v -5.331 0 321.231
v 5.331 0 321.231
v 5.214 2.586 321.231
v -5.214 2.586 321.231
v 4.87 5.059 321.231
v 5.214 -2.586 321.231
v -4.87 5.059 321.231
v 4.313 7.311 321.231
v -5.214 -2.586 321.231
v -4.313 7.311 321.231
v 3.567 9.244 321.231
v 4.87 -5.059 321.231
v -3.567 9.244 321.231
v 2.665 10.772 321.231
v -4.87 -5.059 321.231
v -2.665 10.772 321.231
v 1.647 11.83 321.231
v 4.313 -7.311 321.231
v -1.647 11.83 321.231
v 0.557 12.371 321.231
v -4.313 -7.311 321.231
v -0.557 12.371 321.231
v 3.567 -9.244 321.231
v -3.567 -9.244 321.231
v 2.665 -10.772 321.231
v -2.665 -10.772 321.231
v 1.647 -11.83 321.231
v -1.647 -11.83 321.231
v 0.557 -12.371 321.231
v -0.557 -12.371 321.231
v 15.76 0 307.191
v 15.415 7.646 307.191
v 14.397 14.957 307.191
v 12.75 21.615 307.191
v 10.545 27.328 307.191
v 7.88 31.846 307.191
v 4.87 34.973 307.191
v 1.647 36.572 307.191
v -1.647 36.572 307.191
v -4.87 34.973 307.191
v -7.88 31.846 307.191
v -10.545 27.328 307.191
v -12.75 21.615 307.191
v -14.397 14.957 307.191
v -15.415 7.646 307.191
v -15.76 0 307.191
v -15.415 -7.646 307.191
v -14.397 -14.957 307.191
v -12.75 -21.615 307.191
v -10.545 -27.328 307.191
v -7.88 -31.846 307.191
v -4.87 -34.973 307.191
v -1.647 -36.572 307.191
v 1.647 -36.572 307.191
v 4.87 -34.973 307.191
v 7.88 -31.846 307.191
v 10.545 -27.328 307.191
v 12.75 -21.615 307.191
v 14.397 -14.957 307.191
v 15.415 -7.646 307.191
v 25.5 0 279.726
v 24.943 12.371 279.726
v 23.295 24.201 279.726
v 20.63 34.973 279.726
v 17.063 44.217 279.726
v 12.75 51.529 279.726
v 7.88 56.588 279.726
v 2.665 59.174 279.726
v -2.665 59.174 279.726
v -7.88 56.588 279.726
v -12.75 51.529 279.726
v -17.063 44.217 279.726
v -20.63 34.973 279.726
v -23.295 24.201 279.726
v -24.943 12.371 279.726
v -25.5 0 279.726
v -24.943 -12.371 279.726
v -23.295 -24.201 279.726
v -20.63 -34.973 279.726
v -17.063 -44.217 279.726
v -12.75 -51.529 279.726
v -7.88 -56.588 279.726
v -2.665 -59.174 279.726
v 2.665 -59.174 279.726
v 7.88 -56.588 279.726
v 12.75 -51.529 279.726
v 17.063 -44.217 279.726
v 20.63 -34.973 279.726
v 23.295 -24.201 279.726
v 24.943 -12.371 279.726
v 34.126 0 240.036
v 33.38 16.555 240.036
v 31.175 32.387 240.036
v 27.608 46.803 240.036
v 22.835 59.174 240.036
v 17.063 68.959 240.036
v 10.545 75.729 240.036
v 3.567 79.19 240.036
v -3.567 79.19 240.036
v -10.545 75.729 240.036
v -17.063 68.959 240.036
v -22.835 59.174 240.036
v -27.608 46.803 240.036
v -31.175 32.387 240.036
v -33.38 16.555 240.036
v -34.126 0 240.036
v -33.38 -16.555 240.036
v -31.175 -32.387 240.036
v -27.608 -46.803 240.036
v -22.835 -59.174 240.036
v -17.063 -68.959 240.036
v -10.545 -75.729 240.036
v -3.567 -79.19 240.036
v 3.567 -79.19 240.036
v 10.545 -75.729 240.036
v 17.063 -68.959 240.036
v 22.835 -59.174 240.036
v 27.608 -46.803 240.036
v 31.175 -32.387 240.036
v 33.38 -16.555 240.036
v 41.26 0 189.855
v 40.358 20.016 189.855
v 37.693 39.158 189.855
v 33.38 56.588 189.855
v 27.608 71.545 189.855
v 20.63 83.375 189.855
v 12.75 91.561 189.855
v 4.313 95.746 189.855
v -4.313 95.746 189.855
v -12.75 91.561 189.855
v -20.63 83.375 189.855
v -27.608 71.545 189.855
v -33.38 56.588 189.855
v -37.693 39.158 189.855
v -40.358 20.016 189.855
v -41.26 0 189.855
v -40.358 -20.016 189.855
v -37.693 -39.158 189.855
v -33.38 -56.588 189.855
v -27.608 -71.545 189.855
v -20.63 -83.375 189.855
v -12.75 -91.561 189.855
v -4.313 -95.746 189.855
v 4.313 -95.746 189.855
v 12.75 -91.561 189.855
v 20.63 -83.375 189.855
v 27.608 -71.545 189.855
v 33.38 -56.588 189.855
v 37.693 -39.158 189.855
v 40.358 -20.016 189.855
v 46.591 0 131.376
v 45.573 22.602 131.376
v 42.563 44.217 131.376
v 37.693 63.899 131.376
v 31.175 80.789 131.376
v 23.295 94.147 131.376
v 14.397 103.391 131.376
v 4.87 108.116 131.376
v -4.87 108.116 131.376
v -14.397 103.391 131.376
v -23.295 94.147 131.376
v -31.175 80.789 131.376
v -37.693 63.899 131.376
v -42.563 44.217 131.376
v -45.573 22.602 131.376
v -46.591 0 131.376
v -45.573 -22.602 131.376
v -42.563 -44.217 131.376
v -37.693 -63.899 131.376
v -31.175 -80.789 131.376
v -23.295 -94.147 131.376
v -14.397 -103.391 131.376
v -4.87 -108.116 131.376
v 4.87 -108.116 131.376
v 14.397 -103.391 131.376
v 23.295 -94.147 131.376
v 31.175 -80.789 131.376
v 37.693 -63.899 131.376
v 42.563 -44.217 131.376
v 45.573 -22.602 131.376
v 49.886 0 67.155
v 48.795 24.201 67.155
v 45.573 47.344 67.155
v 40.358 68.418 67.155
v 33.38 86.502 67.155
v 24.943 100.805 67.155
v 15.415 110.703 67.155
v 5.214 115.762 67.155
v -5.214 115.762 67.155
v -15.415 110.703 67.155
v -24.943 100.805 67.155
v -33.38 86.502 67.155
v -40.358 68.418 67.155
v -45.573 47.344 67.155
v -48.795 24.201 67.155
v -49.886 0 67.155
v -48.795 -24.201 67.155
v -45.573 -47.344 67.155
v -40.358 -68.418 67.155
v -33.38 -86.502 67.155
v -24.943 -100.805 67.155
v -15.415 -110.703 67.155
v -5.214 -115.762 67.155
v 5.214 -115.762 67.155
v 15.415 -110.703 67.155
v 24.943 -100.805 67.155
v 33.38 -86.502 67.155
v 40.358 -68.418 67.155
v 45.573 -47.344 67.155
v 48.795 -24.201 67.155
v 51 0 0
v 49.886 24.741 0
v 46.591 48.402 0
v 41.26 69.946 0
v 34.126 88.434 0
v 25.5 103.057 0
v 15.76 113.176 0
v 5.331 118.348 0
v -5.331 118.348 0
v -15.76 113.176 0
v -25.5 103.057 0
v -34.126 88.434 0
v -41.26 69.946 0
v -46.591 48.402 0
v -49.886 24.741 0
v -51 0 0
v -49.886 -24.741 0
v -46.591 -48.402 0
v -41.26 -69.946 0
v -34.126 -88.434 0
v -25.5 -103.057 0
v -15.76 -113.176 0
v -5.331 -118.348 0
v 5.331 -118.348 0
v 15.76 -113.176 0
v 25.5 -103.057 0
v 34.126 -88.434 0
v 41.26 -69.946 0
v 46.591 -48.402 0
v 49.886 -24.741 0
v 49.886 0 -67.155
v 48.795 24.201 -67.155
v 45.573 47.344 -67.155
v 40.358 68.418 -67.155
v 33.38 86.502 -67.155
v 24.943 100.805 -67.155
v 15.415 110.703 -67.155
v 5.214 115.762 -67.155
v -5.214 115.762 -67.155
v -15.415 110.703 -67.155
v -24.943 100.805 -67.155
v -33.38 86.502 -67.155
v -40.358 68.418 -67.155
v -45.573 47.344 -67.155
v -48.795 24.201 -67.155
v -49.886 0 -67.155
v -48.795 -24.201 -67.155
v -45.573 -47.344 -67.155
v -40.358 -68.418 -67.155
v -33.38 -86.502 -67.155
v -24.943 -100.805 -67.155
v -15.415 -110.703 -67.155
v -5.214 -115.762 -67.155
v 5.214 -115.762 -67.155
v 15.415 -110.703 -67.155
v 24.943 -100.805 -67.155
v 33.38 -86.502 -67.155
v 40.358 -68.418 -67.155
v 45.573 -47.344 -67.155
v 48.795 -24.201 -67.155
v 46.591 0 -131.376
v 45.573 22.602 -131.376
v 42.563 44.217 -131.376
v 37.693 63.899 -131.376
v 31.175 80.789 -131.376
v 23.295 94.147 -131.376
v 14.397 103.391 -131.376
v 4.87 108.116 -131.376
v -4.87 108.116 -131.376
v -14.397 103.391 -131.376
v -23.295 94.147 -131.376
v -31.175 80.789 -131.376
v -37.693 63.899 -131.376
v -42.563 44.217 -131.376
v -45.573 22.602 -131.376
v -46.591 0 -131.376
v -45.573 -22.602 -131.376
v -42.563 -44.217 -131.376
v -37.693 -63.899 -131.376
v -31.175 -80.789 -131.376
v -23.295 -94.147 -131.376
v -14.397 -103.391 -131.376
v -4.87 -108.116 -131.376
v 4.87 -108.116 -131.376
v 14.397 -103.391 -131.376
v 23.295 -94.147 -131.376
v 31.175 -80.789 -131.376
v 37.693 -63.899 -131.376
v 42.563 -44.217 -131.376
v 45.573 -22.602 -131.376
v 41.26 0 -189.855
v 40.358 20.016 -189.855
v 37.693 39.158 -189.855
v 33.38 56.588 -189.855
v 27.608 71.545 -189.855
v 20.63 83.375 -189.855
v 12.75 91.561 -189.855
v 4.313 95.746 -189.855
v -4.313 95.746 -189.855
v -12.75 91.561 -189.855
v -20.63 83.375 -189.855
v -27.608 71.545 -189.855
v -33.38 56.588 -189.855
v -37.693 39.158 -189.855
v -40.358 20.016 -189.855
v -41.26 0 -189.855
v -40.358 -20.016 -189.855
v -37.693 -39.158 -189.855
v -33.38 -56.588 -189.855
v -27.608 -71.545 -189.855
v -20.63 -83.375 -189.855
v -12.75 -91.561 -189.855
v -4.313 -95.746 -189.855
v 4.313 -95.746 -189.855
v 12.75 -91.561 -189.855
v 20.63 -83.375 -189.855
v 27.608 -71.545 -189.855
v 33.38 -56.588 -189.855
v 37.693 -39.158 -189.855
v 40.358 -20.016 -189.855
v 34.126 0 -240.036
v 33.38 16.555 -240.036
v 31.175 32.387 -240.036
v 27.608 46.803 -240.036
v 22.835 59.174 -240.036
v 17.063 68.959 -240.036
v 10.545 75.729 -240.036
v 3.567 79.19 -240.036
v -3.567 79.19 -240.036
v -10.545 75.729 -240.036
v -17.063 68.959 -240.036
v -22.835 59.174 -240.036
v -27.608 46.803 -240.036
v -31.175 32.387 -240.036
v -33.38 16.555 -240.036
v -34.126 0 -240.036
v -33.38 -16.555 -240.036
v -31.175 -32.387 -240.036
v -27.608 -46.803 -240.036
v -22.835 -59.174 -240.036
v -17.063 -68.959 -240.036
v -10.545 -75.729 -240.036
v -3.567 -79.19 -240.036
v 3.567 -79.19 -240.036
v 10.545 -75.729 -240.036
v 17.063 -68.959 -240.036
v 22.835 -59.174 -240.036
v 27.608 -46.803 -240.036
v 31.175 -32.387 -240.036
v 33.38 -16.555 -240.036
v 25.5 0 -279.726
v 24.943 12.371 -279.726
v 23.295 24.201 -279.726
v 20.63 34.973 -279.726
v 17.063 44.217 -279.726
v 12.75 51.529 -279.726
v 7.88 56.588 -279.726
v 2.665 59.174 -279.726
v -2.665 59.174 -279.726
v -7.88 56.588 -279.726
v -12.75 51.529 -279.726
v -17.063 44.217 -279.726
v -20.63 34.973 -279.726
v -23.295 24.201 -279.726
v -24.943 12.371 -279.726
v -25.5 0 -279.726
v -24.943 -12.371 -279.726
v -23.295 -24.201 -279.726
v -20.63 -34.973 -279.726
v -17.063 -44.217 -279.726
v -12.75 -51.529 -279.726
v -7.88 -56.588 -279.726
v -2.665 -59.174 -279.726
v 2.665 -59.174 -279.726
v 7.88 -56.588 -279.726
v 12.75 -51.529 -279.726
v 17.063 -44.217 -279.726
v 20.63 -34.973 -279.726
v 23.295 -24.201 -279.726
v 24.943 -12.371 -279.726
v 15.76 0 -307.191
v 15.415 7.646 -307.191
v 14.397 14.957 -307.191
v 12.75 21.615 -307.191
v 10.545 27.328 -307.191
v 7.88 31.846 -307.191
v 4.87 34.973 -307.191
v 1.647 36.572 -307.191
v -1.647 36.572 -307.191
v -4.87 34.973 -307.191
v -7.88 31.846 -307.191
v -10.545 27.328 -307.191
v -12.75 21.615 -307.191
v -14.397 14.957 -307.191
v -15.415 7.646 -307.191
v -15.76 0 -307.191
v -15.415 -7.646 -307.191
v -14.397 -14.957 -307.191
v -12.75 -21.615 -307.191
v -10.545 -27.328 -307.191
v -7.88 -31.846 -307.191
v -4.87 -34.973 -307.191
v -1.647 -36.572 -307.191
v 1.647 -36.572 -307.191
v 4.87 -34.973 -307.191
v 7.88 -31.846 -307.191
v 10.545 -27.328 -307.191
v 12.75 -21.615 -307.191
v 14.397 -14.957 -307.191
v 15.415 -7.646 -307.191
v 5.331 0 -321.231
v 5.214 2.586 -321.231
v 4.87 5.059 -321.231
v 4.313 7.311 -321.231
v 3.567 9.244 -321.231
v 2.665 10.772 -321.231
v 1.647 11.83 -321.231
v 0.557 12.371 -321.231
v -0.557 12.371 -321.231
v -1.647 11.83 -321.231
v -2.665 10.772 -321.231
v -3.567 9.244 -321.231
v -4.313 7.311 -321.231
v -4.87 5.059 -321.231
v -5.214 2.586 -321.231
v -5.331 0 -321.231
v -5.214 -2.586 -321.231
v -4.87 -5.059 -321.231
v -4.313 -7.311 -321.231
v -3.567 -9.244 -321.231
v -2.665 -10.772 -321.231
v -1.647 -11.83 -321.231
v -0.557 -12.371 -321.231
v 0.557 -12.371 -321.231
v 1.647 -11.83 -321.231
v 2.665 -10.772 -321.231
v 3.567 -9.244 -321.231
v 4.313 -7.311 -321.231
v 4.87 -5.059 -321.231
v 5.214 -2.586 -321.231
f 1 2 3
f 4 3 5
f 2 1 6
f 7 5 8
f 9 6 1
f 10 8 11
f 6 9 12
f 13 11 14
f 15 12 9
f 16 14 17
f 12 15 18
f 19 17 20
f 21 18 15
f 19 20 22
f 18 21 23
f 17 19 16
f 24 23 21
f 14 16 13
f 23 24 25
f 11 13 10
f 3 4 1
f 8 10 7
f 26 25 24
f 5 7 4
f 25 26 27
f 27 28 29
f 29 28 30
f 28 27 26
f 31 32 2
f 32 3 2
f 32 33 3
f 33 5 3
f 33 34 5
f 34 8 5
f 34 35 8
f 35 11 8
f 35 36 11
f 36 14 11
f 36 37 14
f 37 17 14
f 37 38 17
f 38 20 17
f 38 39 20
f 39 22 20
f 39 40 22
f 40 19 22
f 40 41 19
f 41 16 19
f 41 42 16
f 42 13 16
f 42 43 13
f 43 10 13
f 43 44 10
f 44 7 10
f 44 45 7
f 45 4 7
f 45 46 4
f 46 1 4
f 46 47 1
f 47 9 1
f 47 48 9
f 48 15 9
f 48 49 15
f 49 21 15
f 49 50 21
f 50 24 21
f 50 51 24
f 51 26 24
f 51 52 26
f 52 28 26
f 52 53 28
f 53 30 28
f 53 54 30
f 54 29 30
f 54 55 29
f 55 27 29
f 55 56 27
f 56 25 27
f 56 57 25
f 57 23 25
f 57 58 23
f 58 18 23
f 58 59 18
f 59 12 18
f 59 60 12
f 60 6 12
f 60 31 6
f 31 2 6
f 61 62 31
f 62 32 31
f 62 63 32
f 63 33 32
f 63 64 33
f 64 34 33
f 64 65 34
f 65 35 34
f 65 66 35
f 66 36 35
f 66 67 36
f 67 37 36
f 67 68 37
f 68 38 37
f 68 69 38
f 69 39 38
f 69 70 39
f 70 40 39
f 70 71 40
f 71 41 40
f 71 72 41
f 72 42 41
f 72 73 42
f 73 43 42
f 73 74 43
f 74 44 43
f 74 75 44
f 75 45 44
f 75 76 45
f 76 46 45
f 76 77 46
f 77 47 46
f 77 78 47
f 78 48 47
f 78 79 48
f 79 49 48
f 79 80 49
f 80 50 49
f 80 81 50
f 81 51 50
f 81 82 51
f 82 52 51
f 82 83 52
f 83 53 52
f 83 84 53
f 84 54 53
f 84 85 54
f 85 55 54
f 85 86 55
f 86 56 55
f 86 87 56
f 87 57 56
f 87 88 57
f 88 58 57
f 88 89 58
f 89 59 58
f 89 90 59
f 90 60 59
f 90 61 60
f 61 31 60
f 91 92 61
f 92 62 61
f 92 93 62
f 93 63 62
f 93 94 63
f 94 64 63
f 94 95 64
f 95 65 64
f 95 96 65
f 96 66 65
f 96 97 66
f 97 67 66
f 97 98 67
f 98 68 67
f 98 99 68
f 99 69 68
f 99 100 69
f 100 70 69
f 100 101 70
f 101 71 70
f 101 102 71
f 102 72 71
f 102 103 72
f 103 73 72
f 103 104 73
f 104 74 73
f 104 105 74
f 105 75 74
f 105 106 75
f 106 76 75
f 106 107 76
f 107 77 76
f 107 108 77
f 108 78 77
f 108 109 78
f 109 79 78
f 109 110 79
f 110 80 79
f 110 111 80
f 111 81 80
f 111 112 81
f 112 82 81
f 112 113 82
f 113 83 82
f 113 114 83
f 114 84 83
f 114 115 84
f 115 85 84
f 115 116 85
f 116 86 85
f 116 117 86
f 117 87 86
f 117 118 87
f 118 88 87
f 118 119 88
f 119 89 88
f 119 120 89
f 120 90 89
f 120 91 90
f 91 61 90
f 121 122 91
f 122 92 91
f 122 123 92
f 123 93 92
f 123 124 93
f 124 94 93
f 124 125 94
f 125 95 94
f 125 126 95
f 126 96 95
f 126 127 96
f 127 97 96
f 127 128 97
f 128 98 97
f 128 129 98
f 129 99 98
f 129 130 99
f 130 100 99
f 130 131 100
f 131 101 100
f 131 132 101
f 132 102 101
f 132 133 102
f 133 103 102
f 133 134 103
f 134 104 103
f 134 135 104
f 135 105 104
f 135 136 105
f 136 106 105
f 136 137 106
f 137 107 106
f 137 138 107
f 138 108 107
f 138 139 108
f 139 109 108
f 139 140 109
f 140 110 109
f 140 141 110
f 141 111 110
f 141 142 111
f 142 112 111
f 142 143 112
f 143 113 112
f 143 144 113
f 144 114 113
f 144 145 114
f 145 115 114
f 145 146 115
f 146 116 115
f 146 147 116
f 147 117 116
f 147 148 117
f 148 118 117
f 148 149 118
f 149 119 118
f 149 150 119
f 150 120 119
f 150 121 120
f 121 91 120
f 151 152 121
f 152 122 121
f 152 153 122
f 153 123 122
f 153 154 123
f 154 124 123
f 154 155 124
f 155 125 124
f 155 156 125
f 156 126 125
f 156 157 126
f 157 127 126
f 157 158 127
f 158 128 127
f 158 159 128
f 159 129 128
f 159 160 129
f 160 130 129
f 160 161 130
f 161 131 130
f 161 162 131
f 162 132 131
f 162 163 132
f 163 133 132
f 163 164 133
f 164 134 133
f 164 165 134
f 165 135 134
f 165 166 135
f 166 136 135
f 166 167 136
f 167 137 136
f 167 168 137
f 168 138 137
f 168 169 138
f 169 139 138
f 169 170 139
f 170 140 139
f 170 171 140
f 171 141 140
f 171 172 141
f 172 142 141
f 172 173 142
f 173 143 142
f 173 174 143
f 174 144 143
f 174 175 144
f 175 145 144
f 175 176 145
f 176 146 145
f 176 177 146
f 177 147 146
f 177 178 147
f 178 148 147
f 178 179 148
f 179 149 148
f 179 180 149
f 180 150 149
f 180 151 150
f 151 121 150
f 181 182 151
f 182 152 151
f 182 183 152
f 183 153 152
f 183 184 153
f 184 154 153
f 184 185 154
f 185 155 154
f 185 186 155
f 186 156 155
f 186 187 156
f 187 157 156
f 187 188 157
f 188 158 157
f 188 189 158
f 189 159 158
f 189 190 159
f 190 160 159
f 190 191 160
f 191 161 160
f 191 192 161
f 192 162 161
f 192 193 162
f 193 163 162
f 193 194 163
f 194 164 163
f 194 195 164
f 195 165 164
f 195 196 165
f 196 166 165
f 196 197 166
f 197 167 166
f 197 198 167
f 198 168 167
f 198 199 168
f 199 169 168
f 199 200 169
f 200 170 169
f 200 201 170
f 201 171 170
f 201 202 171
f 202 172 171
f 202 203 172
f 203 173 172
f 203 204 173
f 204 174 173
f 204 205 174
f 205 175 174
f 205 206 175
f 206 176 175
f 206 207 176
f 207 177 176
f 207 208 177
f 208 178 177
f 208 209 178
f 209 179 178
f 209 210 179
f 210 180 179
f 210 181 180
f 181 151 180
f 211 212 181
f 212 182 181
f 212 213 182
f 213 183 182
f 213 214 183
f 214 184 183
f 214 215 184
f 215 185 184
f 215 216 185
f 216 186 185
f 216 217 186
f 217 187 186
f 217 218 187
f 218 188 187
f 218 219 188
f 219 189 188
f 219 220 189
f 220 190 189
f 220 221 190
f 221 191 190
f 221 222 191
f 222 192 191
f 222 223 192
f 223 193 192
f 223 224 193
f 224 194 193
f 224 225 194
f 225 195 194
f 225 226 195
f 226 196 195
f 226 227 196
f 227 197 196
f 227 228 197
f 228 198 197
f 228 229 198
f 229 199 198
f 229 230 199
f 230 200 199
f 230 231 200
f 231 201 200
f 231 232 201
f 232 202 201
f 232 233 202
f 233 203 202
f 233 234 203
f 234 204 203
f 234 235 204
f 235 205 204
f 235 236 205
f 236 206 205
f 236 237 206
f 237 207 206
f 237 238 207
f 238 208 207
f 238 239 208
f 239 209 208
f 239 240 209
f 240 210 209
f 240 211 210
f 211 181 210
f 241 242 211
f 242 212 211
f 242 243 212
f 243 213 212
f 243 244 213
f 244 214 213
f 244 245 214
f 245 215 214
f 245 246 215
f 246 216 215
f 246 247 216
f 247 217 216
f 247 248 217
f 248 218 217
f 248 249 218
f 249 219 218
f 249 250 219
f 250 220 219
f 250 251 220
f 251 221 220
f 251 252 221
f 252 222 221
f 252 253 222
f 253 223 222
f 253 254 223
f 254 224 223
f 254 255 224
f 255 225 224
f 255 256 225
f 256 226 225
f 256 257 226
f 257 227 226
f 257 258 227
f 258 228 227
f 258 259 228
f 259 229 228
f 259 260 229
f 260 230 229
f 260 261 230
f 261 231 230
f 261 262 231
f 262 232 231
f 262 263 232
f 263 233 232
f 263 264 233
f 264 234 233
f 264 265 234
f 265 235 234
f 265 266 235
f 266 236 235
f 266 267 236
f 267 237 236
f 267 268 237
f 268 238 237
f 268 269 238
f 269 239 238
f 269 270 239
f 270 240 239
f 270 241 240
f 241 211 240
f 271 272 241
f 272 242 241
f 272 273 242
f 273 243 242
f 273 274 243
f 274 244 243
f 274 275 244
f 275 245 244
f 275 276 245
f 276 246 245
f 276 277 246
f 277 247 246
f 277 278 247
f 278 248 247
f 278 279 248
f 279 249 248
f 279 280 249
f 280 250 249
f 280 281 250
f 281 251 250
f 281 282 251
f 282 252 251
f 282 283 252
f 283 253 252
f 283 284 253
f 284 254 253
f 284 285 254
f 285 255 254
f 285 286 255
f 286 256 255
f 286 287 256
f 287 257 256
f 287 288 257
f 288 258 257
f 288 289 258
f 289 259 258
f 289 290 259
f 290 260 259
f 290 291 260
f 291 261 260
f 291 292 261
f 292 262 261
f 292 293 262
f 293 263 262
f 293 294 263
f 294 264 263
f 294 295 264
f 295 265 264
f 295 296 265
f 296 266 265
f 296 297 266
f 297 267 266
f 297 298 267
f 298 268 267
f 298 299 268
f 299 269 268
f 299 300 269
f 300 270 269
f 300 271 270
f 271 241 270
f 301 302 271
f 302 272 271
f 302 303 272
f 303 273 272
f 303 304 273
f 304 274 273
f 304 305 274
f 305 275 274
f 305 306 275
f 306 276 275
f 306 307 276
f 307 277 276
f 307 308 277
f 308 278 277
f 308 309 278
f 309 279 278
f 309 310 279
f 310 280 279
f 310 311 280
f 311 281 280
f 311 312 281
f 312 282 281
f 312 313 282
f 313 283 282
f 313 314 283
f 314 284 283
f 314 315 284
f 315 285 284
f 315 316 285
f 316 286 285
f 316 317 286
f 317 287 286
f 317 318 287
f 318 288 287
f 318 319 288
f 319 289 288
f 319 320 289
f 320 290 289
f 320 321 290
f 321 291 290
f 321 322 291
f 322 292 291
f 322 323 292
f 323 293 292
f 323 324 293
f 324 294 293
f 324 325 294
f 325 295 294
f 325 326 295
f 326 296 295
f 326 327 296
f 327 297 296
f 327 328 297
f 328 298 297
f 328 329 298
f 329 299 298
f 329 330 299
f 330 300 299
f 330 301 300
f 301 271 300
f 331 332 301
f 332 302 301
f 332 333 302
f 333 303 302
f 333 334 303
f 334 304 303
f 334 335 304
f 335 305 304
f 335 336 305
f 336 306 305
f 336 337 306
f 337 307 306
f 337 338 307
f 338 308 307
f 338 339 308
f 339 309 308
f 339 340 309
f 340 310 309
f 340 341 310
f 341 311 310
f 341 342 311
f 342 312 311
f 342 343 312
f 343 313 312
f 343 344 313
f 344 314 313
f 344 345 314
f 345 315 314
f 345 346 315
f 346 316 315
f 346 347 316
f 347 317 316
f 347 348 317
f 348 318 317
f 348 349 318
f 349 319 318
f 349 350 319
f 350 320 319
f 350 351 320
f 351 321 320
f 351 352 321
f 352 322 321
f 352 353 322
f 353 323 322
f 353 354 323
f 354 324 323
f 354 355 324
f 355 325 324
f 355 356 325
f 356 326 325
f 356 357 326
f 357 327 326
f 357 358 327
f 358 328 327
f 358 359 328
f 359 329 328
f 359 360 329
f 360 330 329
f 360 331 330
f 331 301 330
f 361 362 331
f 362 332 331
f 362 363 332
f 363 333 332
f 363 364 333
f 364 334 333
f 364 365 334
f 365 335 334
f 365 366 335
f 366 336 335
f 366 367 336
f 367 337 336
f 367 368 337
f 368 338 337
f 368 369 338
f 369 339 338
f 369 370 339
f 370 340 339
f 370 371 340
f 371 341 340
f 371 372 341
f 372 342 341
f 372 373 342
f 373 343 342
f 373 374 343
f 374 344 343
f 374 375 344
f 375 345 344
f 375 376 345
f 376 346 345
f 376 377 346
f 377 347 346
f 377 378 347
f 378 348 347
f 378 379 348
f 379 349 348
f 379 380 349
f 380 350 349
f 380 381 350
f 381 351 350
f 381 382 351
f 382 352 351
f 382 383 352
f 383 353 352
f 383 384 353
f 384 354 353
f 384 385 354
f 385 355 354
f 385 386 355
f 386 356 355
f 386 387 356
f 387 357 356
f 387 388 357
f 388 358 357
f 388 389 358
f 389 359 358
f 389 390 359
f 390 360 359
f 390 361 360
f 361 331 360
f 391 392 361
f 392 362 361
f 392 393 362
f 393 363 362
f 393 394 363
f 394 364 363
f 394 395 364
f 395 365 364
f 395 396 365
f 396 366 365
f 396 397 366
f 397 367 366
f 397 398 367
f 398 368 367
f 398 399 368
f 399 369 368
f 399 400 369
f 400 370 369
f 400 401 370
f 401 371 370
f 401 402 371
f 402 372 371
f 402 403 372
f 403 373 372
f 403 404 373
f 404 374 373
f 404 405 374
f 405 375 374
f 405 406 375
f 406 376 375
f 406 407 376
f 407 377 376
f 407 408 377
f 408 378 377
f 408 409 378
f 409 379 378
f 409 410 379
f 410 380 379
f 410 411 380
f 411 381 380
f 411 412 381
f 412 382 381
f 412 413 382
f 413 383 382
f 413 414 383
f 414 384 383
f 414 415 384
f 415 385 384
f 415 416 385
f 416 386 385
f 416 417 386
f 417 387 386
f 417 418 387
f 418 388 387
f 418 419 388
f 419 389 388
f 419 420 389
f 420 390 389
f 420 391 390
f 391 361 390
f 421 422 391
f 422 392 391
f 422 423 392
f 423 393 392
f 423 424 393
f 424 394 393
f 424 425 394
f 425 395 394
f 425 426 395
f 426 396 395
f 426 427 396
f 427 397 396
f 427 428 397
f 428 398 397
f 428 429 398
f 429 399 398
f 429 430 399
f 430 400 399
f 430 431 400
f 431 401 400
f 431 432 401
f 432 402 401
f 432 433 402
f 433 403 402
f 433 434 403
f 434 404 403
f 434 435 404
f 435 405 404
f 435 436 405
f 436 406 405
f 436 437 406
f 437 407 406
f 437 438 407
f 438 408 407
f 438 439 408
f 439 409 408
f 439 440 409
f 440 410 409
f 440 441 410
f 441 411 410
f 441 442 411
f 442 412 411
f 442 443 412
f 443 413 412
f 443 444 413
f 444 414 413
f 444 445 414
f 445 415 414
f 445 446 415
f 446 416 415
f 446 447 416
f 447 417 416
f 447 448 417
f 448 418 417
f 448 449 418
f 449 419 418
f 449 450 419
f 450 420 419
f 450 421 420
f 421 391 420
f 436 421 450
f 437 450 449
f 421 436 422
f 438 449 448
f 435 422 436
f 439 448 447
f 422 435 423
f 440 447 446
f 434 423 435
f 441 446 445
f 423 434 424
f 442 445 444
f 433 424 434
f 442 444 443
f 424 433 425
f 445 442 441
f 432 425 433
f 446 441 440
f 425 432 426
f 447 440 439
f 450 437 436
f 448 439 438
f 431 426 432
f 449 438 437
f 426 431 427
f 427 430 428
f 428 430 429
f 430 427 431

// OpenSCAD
// Generated by SolidPython 1.0.1 on 2020-07-29 00:46:45


scale(v = [3, 7, 19]) {
	sphere(r = 17);
}
/***********************************************
*********      SolidPython code:      **********
************************************************
 
# import packages: SolidPython
from solid import *
from solid.utils import *
from itertools import chain, combinations, permutations


class Resize:

    def __init__(self, scad_file):
        self.scad_file = scad_file
        #self.scad_file = import_scad(scad_file)
        # cone/cylinder param:
        self.r1 = 0
        self.r2 = 0
        self.h = 0
        # rectangular prism param:
        self.w = 0
        self.l = 0
        # ellipse param:
        self.r = 0

    # import OpenScad code (file name corresponds to shape)


    # classify shape + parameters
    def assign(self, param1, param2, param3):
        if self.scad_file == 'cone.scad':
            self.r1 = param1
            self.r2 = param2
            self.h = param3
        elif self.scad_file == 'cylinder.scad':
            self.r1 = param1
            self.r2 = param2
            self.h = param3
        elif self.scad_file == 'rectangularPrism.scad':
            self.h = param1
            self.l = param2
            self.w = param3
        else:
            self.r = param1
            self.h = param2

    # resize parameters
    def iterate(self):
        x = range(3, 20, 2)
        i = 1
        if self.scad_file == 'cone.scad':
            tempList = list(permutations(x, 2))
            for temp in tempList:
                param1 = temp[0]
                param2 = temp[1]
                filepath = 'produced_scad_files/' + 'cone' + str(param1) + '_' + str(param2) + '_' + '.scad'
                scad_render_to_file(cylinder(h=param1, r1=param2, r2=0), filepath)

        elif self.scad_file == 'cylinder.scad':
            tempList = list(permutations(x, 3))
            for temp in tempList:
                param1 = temp[0]
                param2 = temp[1]
                filepath = 'produced_scad_files/' + 'cylinder' + str(param1) + '_' + str(param2) + '_' + '.scad'
                scad_render_to_file(cylinder(h=param1, r1=param2, r2=param2), filepath)

        elif self.scad_file == 'rectangularPrism.scad':
            tempList = list(permutations(x, 3))
            for temp in tempList:
                param1 = temp[0]
                param2 = temp[1]
                param3 = temp[2]
                filepath = 'produced_scad_files/' + 'rectangularPrism' + str(param1) + '_' + str(param2) + '_' + str(
                    param3) + '.scad'
                scad_render_to_file(cube(size=(param1, param2, param3)), filepath)

        elif self.scad_file == 'ellipse.scad':
            tempList = list(permutations(x, 4))
            for temp in tempList:
                param1 = temp[0]
                param2 = temp[1]
                param3 = temp[2]
                param4 = temp[3]
                filepath = 'produced_scad_files/' + 'ellipse' + str(param1) + '_' + str(param2) + '_' + str(param3) + '_' + str(param4) + '.scad'
                scad_render_to_file(scale([param1, param2, param3])(sphere(r=param4)), filepath)

    def render_to_scadfile(self):
        scad_render_to_file(scad, 'example.scad') 
 
************************************************/
